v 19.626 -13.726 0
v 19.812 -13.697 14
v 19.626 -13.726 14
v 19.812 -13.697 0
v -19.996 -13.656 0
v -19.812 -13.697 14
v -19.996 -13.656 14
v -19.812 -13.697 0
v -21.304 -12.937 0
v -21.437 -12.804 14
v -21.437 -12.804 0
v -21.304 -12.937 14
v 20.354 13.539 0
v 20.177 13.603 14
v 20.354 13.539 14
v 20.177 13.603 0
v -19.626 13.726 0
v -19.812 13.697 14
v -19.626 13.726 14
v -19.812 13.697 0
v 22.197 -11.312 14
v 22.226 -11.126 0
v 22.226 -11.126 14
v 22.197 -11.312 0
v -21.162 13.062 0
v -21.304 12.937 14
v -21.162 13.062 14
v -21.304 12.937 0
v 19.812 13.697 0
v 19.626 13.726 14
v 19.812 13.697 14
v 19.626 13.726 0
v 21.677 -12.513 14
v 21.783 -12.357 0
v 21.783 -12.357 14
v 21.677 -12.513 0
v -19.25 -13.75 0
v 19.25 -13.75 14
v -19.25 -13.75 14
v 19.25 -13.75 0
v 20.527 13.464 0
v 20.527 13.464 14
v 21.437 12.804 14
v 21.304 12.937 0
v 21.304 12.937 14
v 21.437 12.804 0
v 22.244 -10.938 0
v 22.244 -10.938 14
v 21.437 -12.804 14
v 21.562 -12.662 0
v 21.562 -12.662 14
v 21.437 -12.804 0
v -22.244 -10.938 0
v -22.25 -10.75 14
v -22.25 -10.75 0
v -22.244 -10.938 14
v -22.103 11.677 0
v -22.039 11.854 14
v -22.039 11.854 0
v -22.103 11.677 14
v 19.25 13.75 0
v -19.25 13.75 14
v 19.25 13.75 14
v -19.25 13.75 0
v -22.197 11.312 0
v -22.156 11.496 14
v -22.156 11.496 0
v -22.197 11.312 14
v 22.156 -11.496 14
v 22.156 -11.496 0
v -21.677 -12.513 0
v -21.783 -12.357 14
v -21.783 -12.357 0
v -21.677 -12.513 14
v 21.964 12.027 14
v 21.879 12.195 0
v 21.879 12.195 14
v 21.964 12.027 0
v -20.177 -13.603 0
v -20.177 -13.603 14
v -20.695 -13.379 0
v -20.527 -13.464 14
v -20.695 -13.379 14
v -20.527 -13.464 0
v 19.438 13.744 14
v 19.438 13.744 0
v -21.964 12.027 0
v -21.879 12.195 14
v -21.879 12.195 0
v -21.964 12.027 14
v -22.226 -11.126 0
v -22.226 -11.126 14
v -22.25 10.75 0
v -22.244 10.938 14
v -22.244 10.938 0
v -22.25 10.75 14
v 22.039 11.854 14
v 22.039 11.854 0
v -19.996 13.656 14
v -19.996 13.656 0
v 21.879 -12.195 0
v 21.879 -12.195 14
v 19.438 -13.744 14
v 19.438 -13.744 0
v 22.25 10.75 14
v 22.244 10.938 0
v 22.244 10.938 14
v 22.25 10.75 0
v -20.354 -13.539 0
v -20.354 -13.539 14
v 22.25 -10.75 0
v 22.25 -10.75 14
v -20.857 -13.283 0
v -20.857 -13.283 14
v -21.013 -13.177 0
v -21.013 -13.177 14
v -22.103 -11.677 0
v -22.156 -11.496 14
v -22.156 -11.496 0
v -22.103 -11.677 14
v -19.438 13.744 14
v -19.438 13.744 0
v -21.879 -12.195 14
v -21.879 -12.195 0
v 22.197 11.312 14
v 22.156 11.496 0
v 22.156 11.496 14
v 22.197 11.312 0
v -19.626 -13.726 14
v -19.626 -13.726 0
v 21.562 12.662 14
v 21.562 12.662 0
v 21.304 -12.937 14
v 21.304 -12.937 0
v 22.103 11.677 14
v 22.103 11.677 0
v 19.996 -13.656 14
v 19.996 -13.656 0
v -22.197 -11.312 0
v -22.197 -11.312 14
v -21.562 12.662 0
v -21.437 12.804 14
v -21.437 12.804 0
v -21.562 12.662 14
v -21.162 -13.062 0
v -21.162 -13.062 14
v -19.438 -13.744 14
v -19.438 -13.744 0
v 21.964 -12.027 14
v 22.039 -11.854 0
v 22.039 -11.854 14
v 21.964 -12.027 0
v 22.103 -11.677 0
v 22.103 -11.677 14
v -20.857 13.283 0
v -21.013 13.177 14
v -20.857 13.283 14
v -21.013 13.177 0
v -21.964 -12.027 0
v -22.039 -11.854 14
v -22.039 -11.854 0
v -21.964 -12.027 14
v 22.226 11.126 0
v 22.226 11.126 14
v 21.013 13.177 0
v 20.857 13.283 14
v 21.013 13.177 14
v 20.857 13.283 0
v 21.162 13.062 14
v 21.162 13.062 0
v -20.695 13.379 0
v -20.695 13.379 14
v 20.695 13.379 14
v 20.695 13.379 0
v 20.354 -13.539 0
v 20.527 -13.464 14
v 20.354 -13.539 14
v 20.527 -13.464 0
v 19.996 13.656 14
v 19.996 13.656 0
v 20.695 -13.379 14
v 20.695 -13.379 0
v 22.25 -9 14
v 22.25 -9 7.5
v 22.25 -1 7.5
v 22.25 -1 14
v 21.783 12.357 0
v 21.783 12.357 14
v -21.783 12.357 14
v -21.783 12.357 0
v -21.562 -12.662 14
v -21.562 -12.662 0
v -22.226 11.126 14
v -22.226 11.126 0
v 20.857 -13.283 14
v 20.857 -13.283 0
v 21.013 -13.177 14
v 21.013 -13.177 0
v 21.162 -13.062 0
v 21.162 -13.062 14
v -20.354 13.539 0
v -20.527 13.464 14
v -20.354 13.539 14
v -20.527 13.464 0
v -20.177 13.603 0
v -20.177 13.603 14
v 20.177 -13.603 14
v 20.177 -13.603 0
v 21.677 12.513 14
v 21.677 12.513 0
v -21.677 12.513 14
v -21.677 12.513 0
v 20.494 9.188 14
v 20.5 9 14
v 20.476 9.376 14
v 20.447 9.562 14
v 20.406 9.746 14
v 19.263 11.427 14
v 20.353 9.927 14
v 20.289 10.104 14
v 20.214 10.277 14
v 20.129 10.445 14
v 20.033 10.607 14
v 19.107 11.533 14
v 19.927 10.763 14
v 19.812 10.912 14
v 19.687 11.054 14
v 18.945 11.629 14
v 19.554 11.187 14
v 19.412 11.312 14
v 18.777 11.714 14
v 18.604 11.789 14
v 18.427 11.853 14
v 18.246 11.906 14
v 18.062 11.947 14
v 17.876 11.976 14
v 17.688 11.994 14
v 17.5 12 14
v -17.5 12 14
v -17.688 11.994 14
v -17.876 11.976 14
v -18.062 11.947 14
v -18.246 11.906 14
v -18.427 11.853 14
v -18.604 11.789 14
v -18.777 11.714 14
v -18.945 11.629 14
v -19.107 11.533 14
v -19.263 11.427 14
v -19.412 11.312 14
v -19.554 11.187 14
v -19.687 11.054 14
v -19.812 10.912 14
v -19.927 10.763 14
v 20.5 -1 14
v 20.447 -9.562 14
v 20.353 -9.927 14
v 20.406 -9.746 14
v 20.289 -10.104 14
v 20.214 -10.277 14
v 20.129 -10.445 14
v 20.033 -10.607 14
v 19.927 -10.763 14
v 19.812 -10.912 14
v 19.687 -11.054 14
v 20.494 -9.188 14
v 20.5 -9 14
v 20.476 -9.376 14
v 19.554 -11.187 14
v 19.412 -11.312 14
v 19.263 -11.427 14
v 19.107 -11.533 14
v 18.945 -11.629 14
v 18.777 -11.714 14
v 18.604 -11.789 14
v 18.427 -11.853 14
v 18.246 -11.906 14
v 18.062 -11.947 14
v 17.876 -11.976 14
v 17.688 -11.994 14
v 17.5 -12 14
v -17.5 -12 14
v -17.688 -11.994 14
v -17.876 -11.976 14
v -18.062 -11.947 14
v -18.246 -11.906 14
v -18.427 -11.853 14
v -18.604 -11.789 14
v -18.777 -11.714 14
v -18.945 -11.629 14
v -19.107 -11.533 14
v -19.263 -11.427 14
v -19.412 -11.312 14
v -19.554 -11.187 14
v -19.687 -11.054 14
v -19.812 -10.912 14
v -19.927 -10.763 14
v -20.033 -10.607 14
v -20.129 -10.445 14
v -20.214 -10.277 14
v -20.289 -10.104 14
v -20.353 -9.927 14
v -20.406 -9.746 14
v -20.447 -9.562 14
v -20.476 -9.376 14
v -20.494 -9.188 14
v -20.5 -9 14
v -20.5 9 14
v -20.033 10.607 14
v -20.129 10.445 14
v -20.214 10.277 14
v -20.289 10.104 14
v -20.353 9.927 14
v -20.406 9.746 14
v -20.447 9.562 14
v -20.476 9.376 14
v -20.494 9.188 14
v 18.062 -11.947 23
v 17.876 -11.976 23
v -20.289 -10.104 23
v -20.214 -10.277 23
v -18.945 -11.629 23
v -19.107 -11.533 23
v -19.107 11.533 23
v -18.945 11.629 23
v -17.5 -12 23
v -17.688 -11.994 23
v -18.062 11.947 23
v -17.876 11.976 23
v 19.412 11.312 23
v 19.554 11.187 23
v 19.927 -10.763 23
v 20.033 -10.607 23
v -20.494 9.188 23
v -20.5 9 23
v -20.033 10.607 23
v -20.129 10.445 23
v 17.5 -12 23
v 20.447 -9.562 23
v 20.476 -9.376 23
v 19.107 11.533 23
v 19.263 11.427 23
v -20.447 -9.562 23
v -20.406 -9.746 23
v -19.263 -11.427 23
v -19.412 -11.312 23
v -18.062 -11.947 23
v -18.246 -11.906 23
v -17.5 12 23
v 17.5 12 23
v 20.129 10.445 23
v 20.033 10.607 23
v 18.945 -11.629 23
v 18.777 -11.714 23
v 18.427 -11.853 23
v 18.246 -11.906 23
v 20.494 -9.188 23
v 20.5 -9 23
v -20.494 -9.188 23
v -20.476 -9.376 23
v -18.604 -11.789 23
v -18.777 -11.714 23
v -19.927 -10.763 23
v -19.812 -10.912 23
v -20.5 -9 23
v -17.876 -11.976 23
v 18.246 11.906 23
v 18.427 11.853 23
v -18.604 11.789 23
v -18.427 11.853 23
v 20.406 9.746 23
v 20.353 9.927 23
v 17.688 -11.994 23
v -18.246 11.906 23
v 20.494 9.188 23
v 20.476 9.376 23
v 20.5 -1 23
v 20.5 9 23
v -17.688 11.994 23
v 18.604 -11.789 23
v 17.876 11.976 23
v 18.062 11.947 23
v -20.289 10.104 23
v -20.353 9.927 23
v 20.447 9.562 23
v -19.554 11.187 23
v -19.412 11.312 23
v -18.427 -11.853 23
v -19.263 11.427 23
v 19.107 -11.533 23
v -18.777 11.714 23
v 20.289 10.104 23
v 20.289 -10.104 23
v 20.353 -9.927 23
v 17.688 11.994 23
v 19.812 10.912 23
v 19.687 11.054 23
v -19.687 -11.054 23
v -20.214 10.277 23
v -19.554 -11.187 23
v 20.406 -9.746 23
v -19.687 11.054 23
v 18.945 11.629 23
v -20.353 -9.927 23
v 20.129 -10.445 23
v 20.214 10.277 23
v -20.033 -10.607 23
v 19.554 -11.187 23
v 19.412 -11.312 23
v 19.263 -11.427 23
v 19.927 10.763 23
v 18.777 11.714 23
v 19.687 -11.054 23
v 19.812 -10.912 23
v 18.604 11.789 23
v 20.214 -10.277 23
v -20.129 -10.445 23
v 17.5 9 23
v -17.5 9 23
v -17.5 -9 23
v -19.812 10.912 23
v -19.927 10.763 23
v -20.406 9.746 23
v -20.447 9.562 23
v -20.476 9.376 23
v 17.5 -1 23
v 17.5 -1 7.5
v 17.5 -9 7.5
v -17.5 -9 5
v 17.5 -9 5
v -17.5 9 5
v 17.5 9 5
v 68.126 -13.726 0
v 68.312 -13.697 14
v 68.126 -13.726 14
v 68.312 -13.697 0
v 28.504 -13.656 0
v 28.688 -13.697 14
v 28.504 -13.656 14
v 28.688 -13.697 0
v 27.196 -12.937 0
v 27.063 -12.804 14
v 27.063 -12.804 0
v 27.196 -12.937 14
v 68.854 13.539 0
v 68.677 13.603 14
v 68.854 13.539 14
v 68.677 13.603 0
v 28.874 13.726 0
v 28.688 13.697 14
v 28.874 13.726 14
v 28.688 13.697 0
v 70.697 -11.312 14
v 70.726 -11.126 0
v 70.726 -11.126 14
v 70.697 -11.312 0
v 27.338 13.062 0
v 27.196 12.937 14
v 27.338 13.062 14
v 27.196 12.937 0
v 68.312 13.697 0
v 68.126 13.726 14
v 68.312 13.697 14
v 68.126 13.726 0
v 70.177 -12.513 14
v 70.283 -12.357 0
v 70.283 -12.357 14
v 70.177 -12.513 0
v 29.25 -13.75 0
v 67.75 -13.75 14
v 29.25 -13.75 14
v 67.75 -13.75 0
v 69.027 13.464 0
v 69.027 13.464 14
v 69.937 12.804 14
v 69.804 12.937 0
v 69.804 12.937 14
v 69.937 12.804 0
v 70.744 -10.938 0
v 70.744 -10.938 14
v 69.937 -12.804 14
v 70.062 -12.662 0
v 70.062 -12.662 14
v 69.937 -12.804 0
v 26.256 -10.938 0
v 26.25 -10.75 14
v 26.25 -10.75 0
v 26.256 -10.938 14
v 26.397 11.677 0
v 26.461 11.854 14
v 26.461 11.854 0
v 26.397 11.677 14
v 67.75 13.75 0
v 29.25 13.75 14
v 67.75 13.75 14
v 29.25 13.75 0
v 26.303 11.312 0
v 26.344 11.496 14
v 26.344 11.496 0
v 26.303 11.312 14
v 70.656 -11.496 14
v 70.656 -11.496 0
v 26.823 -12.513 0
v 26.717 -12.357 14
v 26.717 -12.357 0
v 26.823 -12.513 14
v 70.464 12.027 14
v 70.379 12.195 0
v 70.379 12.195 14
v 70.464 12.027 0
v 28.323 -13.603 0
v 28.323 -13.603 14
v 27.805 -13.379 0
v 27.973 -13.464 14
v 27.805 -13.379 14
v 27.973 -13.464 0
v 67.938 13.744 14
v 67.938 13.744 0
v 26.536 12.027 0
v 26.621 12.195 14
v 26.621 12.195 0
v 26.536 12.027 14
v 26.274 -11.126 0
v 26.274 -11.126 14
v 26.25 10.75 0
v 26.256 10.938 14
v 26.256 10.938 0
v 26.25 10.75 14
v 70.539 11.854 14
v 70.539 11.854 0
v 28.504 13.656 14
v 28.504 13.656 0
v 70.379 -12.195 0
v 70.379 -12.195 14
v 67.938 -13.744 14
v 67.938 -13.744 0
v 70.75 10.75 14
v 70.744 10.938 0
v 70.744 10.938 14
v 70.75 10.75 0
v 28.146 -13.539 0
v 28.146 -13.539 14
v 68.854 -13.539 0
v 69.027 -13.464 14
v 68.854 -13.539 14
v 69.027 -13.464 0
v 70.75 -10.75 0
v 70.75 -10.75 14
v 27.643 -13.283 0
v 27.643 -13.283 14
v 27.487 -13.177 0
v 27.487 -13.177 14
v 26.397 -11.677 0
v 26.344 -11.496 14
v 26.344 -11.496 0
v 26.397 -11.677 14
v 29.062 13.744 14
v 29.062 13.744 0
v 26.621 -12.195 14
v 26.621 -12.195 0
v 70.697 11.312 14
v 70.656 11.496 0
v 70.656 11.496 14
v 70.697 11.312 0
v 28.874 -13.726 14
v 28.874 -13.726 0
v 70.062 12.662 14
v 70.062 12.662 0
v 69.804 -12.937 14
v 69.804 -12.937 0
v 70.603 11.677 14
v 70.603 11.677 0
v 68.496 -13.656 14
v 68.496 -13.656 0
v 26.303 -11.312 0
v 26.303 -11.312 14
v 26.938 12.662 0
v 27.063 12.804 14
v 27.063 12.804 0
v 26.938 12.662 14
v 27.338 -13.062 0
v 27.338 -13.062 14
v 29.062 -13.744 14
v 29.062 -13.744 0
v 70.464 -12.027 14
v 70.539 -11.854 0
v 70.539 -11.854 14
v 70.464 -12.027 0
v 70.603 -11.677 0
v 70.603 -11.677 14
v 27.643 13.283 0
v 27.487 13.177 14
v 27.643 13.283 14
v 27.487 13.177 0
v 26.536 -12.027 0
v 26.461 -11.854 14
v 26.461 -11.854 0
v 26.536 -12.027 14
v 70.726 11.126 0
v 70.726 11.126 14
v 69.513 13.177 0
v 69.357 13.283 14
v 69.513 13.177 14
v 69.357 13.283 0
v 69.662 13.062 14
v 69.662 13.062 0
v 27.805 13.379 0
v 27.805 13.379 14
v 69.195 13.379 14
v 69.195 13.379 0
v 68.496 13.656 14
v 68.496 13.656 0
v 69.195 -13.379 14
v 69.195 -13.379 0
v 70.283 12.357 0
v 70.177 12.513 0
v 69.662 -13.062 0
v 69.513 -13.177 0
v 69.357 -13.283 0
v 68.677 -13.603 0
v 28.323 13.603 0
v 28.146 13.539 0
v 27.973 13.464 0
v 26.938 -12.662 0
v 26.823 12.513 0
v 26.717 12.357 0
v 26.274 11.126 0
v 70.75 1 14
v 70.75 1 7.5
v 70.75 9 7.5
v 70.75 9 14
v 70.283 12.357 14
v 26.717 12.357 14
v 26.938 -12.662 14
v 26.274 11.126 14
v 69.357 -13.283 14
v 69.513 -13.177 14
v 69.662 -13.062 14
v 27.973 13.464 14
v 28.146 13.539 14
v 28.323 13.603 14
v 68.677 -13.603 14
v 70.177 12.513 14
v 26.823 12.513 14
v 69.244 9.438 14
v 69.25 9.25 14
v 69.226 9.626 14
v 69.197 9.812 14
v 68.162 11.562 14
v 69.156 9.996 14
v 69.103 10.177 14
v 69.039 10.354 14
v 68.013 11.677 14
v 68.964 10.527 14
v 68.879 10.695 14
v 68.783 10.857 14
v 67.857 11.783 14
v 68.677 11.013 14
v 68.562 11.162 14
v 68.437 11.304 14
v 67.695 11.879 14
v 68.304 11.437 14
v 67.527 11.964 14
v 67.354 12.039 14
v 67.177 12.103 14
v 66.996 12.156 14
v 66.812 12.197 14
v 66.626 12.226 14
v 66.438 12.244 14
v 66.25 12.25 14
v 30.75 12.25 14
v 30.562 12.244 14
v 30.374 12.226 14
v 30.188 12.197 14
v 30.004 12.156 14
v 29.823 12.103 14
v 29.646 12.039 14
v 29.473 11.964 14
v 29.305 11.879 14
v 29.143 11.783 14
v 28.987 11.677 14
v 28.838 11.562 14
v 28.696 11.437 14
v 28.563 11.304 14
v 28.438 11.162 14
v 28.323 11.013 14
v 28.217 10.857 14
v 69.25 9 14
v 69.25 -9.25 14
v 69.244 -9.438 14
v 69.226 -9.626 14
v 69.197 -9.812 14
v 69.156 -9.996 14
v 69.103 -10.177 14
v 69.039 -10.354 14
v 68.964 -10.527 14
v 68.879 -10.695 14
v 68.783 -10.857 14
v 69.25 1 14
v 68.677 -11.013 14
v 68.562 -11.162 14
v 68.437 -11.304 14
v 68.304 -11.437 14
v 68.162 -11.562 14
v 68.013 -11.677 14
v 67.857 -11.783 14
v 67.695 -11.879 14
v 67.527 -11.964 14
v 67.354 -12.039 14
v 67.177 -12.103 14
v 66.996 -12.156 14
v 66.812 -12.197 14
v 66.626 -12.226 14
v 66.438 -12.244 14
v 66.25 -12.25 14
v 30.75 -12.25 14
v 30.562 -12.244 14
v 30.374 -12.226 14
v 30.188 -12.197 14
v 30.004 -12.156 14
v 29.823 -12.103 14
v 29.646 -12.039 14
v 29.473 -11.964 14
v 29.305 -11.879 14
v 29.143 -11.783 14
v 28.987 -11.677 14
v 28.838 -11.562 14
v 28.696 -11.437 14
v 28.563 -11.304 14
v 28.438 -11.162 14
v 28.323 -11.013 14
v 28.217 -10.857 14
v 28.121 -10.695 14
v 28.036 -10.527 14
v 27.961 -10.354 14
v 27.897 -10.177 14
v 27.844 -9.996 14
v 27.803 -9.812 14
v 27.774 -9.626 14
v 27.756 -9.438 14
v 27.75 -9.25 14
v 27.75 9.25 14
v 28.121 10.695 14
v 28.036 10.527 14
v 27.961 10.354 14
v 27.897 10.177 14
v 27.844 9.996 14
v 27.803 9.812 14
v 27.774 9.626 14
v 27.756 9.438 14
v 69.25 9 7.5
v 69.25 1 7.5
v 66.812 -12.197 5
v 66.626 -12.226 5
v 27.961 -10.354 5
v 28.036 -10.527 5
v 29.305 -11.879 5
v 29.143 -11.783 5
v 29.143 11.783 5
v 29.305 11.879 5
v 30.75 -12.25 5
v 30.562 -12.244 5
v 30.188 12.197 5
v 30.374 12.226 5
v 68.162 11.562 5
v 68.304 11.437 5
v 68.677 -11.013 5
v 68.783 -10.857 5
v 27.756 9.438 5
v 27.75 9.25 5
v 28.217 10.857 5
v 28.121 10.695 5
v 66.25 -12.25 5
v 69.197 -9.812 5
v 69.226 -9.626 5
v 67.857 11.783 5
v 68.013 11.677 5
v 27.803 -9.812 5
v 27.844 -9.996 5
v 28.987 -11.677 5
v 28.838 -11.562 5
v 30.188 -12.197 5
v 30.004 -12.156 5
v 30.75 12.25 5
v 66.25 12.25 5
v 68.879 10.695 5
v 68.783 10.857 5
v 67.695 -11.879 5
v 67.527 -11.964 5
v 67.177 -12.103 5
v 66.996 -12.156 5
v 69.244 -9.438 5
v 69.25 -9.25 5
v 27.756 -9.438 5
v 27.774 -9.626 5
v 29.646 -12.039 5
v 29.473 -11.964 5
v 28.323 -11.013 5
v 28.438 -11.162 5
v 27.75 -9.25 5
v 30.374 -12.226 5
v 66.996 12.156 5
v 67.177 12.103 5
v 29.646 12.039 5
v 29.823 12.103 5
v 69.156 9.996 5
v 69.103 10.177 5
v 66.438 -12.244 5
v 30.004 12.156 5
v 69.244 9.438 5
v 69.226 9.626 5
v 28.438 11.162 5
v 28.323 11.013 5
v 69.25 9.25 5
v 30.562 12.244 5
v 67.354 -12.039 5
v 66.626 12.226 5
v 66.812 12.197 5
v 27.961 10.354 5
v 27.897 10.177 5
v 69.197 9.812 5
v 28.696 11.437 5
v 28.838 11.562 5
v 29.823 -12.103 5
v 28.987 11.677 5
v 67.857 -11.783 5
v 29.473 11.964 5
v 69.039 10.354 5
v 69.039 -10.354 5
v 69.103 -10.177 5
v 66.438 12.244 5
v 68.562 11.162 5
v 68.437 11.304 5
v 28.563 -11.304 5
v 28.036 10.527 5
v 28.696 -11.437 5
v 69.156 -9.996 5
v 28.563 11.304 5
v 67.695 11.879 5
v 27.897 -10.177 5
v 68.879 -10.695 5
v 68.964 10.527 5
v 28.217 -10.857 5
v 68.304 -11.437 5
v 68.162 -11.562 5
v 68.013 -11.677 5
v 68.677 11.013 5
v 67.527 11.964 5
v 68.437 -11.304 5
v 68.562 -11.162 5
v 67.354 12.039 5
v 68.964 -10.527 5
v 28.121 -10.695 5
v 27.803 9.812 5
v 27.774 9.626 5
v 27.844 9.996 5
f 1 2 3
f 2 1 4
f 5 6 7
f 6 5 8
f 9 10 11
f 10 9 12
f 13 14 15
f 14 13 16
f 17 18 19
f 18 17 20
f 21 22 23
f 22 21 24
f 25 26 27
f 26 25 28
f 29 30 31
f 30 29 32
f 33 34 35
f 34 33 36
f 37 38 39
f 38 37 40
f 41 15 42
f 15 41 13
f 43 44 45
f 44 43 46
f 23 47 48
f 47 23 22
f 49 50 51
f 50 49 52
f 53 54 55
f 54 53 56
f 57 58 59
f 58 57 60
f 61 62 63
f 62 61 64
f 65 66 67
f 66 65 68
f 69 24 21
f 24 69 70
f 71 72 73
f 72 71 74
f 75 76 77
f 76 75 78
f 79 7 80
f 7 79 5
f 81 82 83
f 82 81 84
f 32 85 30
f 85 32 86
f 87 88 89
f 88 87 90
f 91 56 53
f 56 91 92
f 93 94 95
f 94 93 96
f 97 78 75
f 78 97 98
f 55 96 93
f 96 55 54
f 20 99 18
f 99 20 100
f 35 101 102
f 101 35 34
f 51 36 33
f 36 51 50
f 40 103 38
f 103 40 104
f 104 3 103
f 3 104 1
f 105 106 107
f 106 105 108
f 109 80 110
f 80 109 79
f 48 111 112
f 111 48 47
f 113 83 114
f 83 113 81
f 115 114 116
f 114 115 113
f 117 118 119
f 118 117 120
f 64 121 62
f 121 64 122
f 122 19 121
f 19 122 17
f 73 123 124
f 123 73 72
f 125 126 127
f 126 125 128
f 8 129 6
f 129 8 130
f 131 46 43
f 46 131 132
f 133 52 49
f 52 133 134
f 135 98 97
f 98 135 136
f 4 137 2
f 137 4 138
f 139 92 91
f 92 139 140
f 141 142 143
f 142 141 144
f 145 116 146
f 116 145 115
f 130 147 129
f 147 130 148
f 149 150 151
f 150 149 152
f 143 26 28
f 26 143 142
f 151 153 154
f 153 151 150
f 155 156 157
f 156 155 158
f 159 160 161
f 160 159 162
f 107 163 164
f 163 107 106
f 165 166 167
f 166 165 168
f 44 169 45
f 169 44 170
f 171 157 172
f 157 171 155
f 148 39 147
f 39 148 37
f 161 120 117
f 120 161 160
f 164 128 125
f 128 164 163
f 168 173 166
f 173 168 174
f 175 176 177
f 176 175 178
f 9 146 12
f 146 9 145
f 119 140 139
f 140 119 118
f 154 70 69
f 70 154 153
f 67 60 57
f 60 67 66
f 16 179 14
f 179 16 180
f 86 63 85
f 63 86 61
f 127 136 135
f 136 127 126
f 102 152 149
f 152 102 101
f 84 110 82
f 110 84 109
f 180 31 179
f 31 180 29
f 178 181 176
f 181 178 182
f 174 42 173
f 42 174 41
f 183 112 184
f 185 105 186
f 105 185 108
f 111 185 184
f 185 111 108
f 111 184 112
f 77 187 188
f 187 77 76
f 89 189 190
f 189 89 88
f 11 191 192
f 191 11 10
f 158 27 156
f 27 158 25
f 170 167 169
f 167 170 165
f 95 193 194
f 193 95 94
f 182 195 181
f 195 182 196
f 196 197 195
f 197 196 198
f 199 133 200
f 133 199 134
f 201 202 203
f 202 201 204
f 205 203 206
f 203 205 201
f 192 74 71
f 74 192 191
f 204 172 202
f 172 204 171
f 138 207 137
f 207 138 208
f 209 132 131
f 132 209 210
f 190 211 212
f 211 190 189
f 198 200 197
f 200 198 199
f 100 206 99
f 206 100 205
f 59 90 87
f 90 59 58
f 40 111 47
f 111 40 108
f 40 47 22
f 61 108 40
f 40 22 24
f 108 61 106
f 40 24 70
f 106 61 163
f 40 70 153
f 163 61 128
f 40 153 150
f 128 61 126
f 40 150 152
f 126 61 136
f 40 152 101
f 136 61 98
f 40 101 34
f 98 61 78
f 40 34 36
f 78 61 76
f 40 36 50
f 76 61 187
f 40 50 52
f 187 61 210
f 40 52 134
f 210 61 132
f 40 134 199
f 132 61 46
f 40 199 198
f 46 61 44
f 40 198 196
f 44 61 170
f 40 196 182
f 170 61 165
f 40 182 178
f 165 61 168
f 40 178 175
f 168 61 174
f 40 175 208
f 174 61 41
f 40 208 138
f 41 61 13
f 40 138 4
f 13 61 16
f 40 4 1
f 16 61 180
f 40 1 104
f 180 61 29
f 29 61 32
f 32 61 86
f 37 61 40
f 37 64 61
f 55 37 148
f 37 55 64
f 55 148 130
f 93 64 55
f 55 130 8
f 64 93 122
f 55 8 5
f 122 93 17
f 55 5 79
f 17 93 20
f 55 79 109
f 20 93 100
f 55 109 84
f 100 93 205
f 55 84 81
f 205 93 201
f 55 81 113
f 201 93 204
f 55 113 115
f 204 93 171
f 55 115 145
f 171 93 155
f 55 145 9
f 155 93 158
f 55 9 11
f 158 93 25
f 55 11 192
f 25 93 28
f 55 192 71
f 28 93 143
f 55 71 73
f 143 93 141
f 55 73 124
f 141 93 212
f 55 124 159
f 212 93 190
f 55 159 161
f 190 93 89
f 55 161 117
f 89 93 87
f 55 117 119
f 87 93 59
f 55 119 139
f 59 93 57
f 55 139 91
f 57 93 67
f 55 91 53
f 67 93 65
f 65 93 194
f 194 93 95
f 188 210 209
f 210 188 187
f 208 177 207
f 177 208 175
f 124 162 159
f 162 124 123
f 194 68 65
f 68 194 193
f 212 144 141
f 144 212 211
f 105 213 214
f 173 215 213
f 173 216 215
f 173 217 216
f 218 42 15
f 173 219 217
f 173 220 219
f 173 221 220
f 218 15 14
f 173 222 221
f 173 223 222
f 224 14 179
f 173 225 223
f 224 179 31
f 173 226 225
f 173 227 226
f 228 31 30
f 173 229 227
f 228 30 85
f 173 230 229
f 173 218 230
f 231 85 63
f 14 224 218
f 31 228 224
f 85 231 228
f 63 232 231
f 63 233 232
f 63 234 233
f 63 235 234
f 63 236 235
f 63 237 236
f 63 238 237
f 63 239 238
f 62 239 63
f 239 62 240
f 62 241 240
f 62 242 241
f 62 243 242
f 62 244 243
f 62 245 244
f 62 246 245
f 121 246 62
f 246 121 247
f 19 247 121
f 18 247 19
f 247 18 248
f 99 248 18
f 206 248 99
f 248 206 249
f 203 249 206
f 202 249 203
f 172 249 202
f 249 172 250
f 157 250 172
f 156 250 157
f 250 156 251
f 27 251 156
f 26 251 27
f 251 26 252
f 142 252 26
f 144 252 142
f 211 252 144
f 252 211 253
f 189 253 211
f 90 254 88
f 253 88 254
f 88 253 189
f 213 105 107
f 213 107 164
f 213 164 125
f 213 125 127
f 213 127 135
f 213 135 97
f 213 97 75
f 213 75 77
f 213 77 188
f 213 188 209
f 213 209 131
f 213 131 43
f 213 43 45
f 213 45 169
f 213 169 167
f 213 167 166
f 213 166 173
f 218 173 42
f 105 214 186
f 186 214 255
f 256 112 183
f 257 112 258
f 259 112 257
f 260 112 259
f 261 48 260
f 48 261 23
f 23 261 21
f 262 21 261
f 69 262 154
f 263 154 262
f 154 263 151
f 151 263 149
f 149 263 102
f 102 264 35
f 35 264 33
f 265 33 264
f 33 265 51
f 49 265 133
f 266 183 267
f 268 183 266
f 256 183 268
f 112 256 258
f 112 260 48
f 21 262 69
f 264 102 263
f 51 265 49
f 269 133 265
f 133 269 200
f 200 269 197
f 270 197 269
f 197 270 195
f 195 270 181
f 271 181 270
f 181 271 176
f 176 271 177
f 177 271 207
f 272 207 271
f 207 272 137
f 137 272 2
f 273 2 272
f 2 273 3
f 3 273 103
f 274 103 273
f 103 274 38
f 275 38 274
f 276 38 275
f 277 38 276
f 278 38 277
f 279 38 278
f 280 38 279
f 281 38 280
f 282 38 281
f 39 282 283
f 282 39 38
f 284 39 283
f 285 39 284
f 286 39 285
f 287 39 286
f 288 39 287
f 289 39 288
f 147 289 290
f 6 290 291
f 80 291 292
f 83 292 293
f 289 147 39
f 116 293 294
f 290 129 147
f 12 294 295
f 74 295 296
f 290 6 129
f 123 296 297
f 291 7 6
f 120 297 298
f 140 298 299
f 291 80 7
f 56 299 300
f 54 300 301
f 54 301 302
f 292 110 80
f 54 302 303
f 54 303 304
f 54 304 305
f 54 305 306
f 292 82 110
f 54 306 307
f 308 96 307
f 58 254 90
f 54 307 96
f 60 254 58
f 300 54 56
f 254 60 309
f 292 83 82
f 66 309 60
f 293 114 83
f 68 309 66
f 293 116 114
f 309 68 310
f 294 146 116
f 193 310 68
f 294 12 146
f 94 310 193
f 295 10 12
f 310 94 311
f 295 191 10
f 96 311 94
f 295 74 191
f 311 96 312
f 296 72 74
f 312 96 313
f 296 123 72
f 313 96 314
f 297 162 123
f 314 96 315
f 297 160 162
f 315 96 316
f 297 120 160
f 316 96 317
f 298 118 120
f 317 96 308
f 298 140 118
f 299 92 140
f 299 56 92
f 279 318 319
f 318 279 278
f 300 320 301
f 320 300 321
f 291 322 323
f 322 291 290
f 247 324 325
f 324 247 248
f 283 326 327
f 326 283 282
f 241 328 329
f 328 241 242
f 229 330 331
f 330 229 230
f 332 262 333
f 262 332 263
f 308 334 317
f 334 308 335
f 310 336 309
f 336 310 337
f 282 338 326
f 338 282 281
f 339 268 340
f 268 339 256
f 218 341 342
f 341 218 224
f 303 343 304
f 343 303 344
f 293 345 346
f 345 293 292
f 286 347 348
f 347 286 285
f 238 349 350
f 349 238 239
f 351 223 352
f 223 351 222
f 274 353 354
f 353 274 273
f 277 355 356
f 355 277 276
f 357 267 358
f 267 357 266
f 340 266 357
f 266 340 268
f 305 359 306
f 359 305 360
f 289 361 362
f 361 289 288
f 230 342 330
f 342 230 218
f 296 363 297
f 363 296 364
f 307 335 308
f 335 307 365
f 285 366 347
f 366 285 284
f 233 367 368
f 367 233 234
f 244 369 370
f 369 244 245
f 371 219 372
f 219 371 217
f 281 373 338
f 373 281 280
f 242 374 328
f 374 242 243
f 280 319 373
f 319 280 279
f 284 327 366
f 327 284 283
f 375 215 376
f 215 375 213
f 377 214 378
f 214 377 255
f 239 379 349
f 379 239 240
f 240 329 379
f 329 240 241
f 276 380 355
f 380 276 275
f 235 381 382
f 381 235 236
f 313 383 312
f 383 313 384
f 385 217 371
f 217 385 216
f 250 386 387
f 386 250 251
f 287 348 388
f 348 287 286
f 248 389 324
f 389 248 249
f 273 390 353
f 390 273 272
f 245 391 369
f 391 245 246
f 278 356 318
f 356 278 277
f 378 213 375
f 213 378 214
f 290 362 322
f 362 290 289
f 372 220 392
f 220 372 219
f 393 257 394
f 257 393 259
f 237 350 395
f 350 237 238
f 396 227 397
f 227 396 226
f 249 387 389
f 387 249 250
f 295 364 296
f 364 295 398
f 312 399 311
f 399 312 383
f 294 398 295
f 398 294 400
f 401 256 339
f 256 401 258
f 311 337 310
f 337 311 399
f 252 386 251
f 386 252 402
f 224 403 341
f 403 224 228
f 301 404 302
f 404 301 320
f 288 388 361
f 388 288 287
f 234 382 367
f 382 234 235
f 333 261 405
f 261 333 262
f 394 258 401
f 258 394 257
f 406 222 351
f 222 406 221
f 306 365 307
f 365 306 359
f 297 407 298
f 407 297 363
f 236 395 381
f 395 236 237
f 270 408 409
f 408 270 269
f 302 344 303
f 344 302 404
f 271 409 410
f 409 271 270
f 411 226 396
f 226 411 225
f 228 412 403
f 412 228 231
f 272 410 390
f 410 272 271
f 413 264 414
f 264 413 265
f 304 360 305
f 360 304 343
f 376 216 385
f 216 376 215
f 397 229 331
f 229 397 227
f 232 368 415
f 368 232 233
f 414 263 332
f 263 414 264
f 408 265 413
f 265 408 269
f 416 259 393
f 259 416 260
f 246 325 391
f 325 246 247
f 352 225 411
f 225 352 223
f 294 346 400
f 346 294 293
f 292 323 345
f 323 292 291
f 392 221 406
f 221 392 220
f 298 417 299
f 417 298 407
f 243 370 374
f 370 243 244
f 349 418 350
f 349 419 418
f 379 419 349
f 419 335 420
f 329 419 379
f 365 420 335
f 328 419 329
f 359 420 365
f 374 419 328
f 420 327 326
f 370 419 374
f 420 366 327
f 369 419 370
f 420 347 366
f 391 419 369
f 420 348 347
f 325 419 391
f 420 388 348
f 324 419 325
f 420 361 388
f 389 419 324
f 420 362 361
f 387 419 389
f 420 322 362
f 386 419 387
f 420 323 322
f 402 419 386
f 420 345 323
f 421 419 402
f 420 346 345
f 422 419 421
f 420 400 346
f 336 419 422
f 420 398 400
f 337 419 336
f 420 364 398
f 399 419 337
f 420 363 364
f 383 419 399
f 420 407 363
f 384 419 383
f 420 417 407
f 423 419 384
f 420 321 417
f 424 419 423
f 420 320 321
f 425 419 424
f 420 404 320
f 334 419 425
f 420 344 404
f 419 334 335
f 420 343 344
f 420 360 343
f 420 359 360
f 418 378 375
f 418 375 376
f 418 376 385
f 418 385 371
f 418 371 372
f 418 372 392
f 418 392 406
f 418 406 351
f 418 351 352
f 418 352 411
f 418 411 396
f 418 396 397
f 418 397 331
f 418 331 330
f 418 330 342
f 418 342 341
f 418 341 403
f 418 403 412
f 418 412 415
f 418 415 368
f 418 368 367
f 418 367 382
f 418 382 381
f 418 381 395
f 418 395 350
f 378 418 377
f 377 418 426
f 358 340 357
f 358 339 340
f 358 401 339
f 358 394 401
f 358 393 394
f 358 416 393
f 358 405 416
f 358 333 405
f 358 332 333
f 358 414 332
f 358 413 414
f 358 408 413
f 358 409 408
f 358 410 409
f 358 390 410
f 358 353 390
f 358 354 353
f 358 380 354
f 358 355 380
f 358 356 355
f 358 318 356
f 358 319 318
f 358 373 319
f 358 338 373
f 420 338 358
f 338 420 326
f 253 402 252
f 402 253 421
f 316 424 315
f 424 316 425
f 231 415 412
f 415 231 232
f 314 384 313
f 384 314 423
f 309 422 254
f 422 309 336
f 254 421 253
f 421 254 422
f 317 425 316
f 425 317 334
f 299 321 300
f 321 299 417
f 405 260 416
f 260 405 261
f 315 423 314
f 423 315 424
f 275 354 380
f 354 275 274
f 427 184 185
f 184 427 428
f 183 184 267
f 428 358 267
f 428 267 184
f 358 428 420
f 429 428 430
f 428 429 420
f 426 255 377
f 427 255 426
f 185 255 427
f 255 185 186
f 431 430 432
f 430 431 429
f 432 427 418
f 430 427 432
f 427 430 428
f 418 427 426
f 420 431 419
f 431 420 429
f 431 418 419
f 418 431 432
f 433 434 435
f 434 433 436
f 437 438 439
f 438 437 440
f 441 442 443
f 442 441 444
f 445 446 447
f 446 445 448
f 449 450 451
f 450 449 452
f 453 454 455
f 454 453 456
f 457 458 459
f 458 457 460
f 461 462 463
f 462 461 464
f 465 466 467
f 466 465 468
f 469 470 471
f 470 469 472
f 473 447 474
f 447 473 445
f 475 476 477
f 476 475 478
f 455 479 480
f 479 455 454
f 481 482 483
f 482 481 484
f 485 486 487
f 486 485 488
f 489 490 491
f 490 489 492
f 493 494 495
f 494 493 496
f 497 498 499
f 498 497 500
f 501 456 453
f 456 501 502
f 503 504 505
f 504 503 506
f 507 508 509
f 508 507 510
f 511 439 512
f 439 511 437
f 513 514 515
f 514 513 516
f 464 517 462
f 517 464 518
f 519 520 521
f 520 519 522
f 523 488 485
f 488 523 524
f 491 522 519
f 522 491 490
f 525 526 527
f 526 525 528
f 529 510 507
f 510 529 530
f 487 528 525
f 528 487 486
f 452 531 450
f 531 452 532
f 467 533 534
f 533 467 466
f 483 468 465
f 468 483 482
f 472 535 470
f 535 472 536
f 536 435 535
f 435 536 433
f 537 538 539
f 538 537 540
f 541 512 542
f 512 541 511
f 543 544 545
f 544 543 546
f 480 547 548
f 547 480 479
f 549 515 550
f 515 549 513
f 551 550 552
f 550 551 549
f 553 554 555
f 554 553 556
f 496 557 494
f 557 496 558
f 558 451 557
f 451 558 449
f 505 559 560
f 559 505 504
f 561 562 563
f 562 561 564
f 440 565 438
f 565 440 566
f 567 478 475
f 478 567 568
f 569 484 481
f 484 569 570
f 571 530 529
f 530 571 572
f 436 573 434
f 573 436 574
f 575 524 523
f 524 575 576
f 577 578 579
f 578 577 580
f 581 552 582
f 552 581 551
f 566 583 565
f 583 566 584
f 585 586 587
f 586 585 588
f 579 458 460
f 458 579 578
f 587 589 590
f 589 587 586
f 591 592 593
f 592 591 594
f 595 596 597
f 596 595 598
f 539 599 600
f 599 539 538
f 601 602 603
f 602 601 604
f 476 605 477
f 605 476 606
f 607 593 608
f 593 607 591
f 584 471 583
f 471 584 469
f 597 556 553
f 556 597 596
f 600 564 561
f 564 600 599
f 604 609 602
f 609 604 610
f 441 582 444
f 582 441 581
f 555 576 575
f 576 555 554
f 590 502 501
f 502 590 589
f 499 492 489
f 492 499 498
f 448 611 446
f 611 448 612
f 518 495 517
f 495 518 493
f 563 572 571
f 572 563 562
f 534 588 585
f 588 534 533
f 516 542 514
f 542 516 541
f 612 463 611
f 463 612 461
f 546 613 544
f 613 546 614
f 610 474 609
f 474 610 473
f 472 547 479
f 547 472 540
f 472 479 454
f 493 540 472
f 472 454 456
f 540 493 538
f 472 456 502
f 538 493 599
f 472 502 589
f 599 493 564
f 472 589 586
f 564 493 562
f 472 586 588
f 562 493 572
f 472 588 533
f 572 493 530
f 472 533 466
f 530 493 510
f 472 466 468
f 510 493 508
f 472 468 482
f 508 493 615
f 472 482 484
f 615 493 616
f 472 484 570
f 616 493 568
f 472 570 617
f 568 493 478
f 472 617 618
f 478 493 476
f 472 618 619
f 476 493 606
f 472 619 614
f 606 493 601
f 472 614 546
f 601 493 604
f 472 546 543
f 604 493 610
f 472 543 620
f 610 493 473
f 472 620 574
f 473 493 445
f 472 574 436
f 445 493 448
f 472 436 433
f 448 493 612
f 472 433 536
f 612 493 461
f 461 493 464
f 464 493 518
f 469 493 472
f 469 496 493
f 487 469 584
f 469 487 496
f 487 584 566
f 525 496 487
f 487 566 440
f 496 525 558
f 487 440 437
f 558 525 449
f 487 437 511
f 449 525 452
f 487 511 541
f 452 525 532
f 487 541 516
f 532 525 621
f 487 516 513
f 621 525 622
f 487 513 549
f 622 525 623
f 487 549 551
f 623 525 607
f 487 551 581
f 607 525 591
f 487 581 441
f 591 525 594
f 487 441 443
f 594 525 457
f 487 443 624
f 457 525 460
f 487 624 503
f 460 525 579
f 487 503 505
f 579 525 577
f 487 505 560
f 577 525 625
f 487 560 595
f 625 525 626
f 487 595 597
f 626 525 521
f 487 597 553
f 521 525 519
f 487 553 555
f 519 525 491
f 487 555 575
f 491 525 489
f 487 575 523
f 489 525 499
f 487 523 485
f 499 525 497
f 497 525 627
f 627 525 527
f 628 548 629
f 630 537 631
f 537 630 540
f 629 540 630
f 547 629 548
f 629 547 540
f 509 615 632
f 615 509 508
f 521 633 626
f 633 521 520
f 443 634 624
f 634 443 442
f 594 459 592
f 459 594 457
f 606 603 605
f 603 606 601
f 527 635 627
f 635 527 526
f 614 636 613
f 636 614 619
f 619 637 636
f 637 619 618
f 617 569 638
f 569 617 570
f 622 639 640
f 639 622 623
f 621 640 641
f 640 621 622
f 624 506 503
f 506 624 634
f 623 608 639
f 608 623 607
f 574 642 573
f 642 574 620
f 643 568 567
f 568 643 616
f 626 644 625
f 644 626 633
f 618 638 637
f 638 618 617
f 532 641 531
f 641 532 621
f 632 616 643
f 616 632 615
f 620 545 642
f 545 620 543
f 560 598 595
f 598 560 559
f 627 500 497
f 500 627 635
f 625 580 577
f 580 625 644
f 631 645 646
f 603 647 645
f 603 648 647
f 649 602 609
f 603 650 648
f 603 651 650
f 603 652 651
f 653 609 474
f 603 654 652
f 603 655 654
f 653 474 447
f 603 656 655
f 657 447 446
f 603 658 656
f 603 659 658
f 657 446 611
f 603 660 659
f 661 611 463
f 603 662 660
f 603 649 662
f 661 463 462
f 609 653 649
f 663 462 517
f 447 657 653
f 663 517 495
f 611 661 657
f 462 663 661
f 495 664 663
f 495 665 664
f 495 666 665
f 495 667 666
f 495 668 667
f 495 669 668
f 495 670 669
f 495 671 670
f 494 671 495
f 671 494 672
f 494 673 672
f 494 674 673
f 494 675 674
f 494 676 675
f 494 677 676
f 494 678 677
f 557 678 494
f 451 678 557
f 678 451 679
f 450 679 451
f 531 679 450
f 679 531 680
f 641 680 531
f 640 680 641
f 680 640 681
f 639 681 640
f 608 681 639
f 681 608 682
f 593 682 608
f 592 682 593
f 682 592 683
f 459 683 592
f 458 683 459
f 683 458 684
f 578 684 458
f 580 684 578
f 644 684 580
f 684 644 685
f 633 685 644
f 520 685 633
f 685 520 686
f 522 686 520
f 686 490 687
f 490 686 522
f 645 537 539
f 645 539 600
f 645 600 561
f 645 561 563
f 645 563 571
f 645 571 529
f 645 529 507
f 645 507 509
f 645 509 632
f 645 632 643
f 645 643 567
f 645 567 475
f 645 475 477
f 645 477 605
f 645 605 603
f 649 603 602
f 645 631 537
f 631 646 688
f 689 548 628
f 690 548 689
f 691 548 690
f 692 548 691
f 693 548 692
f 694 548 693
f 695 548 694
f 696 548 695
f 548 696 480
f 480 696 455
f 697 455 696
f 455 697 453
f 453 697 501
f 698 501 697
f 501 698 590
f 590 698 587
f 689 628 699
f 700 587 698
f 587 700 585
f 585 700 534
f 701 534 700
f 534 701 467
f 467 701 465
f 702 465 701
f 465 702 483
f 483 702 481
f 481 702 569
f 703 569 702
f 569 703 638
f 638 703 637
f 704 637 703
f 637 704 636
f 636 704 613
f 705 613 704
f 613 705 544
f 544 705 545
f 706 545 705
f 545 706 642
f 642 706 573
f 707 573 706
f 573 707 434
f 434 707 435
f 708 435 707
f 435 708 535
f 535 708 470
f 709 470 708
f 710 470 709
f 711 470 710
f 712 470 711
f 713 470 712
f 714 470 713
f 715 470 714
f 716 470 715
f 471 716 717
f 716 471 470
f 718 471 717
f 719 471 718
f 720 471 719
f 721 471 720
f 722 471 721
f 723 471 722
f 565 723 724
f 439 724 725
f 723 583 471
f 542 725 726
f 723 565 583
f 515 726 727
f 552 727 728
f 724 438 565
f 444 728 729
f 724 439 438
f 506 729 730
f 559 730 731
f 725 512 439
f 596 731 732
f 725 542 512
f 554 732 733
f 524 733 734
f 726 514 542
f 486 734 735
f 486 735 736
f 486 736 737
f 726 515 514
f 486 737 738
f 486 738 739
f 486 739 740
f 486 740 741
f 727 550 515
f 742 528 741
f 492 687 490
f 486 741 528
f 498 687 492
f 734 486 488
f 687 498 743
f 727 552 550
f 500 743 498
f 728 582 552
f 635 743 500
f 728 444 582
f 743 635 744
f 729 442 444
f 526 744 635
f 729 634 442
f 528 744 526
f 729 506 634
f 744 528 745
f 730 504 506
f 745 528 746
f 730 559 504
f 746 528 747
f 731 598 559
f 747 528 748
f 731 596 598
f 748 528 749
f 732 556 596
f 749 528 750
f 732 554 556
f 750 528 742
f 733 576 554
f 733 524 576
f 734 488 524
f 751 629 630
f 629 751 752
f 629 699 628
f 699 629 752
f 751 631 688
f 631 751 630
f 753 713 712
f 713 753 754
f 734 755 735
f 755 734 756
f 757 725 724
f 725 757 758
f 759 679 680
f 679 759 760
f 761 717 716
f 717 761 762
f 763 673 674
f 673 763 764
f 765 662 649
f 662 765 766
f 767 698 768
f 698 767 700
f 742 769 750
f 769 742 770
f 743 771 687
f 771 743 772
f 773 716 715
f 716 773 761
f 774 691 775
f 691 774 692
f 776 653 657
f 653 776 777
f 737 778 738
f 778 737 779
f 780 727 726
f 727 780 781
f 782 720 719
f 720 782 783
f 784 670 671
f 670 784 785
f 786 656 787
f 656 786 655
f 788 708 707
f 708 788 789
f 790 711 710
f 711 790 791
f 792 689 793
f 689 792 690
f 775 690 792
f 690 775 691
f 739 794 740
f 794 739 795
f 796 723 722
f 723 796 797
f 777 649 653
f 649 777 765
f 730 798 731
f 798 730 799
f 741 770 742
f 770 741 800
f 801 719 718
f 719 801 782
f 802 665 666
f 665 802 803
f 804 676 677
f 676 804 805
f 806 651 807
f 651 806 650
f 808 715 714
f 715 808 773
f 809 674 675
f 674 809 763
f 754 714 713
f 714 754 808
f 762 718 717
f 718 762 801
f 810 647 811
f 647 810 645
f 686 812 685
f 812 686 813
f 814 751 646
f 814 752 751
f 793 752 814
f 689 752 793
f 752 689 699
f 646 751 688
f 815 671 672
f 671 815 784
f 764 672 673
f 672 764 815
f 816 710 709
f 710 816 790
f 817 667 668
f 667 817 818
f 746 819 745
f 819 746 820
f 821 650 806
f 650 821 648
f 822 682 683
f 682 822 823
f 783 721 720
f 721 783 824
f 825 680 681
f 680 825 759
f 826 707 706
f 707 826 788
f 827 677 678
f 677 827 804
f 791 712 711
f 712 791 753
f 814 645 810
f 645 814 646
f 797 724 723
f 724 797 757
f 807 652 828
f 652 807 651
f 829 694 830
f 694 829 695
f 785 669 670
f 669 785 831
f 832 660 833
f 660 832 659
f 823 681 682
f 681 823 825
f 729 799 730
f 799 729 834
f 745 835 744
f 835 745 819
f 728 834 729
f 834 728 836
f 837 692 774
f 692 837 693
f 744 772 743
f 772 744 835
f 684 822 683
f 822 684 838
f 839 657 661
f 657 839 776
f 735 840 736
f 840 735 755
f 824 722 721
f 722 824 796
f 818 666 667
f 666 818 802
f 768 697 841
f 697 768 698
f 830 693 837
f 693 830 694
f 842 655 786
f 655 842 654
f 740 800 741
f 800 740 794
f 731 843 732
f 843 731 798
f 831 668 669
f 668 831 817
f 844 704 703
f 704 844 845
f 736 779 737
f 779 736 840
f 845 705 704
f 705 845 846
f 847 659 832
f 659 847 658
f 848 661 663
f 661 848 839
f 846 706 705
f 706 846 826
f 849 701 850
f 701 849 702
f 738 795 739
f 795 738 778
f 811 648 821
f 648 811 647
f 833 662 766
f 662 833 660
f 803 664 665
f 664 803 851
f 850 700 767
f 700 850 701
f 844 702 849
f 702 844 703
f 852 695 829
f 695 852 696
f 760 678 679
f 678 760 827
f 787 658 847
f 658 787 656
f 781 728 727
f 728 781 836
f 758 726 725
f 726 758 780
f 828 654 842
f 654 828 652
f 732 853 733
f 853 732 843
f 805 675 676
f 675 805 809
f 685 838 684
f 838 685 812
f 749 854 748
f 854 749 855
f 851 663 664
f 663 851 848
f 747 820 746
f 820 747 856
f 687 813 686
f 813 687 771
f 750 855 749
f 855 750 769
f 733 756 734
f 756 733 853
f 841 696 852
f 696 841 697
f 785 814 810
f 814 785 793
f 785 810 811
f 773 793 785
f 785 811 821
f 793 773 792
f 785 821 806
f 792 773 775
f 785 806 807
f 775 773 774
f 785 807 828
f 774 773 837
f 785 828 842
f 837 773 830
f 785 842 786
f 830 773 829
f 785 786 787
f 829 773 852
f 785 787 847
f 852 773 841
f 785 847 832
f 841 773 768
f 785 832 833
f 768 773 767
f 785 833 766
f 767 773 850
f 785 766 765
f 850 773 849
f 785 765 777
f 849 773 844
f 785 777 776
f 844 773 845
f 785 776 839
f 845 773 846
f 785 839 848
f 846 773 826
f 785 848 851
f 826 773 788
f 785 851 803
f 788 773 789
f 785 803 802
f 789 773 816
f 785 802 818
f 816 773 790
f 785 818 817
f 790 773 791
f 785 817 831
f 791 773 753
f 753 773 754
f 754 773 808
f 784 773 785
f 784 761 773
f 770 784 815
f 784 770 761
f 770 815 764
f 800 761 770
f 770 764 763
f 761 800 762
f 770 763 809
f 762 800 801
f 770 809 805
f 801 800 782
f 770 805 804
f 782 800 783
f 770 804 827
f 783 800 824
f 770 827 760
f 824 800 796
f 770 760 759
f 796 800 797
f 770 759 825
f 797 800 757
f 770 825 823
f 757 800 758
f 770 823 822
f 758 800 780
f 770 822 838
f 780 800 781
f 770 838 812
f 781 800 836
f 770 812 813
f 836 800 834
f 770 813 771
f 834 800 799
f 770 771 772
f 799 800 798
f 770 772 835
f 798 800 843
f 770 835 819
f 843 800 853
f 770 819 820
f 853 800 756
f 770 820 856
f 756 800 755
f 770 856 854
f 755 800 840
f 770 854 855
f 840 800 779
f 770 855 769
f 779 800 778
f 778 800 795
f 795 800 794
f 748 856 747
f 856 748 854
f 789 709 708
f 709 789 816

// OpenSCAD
//intérieur boite

lo=35;  //longueur
la=18;  //largeur
ha=18;  //hauteur
mur=3;   // /epaisseur des mur
hb=5;   //hauteur base
ou=8; // ouverture pour manche
precision=0.25; //espace entre le couvercle et la base

//receptacle

       difference(){
       union(){
       translate([0,0,0])base(lo+mur+2*precision,la+mur+2*precision,hb,mur);  
       translate([0,0,hb])base(lo+mur+2*precision,la+mur+2*precision,ha/2,mur);  
       translate([0,0,hb]) base(lo,la,ha,mur);
      
       }
       union(){
       translate([lo/2,-(la-ou)/2,(ha+hb)/2-ou/2])base(1.5*lo,ou,ha+5,0);
       translate([0,0,hb]) base(lo,la,ha+2,0);
        }
      }
    // text("Étienne",6);
//cover
        
      coverX = lo+2*mur+2*precision+7;
      difference(){
      union(){
        translate([coverX,0,0]) 
          #base(lo+mur+2*precision,la+mur+2*precision,hb,mur);
        translate([coverX,0,hb]) 
          base(lo+mur+2*precision,la+mur+2*precision,ha/2,mur);
      }
      union(){
        translate([coverX+lo/2,(la-ou)/2,(ha+hb)/2-ou/2])base(1.5*lo,ou,ha+5,0);    
      translate([coverX,0,hb])
        base(lo+2*precision,la+2*precision,ha,mur);
      }
  }
      translate([-14,0,hb]) text("Étienne",6,3);

module base(lo,la,ha,mur){
   linear_extrude(height=ha,center=false){ 
       offset(r=mur,$fn=100)
        square([lo,la],center=true);
   }
}
